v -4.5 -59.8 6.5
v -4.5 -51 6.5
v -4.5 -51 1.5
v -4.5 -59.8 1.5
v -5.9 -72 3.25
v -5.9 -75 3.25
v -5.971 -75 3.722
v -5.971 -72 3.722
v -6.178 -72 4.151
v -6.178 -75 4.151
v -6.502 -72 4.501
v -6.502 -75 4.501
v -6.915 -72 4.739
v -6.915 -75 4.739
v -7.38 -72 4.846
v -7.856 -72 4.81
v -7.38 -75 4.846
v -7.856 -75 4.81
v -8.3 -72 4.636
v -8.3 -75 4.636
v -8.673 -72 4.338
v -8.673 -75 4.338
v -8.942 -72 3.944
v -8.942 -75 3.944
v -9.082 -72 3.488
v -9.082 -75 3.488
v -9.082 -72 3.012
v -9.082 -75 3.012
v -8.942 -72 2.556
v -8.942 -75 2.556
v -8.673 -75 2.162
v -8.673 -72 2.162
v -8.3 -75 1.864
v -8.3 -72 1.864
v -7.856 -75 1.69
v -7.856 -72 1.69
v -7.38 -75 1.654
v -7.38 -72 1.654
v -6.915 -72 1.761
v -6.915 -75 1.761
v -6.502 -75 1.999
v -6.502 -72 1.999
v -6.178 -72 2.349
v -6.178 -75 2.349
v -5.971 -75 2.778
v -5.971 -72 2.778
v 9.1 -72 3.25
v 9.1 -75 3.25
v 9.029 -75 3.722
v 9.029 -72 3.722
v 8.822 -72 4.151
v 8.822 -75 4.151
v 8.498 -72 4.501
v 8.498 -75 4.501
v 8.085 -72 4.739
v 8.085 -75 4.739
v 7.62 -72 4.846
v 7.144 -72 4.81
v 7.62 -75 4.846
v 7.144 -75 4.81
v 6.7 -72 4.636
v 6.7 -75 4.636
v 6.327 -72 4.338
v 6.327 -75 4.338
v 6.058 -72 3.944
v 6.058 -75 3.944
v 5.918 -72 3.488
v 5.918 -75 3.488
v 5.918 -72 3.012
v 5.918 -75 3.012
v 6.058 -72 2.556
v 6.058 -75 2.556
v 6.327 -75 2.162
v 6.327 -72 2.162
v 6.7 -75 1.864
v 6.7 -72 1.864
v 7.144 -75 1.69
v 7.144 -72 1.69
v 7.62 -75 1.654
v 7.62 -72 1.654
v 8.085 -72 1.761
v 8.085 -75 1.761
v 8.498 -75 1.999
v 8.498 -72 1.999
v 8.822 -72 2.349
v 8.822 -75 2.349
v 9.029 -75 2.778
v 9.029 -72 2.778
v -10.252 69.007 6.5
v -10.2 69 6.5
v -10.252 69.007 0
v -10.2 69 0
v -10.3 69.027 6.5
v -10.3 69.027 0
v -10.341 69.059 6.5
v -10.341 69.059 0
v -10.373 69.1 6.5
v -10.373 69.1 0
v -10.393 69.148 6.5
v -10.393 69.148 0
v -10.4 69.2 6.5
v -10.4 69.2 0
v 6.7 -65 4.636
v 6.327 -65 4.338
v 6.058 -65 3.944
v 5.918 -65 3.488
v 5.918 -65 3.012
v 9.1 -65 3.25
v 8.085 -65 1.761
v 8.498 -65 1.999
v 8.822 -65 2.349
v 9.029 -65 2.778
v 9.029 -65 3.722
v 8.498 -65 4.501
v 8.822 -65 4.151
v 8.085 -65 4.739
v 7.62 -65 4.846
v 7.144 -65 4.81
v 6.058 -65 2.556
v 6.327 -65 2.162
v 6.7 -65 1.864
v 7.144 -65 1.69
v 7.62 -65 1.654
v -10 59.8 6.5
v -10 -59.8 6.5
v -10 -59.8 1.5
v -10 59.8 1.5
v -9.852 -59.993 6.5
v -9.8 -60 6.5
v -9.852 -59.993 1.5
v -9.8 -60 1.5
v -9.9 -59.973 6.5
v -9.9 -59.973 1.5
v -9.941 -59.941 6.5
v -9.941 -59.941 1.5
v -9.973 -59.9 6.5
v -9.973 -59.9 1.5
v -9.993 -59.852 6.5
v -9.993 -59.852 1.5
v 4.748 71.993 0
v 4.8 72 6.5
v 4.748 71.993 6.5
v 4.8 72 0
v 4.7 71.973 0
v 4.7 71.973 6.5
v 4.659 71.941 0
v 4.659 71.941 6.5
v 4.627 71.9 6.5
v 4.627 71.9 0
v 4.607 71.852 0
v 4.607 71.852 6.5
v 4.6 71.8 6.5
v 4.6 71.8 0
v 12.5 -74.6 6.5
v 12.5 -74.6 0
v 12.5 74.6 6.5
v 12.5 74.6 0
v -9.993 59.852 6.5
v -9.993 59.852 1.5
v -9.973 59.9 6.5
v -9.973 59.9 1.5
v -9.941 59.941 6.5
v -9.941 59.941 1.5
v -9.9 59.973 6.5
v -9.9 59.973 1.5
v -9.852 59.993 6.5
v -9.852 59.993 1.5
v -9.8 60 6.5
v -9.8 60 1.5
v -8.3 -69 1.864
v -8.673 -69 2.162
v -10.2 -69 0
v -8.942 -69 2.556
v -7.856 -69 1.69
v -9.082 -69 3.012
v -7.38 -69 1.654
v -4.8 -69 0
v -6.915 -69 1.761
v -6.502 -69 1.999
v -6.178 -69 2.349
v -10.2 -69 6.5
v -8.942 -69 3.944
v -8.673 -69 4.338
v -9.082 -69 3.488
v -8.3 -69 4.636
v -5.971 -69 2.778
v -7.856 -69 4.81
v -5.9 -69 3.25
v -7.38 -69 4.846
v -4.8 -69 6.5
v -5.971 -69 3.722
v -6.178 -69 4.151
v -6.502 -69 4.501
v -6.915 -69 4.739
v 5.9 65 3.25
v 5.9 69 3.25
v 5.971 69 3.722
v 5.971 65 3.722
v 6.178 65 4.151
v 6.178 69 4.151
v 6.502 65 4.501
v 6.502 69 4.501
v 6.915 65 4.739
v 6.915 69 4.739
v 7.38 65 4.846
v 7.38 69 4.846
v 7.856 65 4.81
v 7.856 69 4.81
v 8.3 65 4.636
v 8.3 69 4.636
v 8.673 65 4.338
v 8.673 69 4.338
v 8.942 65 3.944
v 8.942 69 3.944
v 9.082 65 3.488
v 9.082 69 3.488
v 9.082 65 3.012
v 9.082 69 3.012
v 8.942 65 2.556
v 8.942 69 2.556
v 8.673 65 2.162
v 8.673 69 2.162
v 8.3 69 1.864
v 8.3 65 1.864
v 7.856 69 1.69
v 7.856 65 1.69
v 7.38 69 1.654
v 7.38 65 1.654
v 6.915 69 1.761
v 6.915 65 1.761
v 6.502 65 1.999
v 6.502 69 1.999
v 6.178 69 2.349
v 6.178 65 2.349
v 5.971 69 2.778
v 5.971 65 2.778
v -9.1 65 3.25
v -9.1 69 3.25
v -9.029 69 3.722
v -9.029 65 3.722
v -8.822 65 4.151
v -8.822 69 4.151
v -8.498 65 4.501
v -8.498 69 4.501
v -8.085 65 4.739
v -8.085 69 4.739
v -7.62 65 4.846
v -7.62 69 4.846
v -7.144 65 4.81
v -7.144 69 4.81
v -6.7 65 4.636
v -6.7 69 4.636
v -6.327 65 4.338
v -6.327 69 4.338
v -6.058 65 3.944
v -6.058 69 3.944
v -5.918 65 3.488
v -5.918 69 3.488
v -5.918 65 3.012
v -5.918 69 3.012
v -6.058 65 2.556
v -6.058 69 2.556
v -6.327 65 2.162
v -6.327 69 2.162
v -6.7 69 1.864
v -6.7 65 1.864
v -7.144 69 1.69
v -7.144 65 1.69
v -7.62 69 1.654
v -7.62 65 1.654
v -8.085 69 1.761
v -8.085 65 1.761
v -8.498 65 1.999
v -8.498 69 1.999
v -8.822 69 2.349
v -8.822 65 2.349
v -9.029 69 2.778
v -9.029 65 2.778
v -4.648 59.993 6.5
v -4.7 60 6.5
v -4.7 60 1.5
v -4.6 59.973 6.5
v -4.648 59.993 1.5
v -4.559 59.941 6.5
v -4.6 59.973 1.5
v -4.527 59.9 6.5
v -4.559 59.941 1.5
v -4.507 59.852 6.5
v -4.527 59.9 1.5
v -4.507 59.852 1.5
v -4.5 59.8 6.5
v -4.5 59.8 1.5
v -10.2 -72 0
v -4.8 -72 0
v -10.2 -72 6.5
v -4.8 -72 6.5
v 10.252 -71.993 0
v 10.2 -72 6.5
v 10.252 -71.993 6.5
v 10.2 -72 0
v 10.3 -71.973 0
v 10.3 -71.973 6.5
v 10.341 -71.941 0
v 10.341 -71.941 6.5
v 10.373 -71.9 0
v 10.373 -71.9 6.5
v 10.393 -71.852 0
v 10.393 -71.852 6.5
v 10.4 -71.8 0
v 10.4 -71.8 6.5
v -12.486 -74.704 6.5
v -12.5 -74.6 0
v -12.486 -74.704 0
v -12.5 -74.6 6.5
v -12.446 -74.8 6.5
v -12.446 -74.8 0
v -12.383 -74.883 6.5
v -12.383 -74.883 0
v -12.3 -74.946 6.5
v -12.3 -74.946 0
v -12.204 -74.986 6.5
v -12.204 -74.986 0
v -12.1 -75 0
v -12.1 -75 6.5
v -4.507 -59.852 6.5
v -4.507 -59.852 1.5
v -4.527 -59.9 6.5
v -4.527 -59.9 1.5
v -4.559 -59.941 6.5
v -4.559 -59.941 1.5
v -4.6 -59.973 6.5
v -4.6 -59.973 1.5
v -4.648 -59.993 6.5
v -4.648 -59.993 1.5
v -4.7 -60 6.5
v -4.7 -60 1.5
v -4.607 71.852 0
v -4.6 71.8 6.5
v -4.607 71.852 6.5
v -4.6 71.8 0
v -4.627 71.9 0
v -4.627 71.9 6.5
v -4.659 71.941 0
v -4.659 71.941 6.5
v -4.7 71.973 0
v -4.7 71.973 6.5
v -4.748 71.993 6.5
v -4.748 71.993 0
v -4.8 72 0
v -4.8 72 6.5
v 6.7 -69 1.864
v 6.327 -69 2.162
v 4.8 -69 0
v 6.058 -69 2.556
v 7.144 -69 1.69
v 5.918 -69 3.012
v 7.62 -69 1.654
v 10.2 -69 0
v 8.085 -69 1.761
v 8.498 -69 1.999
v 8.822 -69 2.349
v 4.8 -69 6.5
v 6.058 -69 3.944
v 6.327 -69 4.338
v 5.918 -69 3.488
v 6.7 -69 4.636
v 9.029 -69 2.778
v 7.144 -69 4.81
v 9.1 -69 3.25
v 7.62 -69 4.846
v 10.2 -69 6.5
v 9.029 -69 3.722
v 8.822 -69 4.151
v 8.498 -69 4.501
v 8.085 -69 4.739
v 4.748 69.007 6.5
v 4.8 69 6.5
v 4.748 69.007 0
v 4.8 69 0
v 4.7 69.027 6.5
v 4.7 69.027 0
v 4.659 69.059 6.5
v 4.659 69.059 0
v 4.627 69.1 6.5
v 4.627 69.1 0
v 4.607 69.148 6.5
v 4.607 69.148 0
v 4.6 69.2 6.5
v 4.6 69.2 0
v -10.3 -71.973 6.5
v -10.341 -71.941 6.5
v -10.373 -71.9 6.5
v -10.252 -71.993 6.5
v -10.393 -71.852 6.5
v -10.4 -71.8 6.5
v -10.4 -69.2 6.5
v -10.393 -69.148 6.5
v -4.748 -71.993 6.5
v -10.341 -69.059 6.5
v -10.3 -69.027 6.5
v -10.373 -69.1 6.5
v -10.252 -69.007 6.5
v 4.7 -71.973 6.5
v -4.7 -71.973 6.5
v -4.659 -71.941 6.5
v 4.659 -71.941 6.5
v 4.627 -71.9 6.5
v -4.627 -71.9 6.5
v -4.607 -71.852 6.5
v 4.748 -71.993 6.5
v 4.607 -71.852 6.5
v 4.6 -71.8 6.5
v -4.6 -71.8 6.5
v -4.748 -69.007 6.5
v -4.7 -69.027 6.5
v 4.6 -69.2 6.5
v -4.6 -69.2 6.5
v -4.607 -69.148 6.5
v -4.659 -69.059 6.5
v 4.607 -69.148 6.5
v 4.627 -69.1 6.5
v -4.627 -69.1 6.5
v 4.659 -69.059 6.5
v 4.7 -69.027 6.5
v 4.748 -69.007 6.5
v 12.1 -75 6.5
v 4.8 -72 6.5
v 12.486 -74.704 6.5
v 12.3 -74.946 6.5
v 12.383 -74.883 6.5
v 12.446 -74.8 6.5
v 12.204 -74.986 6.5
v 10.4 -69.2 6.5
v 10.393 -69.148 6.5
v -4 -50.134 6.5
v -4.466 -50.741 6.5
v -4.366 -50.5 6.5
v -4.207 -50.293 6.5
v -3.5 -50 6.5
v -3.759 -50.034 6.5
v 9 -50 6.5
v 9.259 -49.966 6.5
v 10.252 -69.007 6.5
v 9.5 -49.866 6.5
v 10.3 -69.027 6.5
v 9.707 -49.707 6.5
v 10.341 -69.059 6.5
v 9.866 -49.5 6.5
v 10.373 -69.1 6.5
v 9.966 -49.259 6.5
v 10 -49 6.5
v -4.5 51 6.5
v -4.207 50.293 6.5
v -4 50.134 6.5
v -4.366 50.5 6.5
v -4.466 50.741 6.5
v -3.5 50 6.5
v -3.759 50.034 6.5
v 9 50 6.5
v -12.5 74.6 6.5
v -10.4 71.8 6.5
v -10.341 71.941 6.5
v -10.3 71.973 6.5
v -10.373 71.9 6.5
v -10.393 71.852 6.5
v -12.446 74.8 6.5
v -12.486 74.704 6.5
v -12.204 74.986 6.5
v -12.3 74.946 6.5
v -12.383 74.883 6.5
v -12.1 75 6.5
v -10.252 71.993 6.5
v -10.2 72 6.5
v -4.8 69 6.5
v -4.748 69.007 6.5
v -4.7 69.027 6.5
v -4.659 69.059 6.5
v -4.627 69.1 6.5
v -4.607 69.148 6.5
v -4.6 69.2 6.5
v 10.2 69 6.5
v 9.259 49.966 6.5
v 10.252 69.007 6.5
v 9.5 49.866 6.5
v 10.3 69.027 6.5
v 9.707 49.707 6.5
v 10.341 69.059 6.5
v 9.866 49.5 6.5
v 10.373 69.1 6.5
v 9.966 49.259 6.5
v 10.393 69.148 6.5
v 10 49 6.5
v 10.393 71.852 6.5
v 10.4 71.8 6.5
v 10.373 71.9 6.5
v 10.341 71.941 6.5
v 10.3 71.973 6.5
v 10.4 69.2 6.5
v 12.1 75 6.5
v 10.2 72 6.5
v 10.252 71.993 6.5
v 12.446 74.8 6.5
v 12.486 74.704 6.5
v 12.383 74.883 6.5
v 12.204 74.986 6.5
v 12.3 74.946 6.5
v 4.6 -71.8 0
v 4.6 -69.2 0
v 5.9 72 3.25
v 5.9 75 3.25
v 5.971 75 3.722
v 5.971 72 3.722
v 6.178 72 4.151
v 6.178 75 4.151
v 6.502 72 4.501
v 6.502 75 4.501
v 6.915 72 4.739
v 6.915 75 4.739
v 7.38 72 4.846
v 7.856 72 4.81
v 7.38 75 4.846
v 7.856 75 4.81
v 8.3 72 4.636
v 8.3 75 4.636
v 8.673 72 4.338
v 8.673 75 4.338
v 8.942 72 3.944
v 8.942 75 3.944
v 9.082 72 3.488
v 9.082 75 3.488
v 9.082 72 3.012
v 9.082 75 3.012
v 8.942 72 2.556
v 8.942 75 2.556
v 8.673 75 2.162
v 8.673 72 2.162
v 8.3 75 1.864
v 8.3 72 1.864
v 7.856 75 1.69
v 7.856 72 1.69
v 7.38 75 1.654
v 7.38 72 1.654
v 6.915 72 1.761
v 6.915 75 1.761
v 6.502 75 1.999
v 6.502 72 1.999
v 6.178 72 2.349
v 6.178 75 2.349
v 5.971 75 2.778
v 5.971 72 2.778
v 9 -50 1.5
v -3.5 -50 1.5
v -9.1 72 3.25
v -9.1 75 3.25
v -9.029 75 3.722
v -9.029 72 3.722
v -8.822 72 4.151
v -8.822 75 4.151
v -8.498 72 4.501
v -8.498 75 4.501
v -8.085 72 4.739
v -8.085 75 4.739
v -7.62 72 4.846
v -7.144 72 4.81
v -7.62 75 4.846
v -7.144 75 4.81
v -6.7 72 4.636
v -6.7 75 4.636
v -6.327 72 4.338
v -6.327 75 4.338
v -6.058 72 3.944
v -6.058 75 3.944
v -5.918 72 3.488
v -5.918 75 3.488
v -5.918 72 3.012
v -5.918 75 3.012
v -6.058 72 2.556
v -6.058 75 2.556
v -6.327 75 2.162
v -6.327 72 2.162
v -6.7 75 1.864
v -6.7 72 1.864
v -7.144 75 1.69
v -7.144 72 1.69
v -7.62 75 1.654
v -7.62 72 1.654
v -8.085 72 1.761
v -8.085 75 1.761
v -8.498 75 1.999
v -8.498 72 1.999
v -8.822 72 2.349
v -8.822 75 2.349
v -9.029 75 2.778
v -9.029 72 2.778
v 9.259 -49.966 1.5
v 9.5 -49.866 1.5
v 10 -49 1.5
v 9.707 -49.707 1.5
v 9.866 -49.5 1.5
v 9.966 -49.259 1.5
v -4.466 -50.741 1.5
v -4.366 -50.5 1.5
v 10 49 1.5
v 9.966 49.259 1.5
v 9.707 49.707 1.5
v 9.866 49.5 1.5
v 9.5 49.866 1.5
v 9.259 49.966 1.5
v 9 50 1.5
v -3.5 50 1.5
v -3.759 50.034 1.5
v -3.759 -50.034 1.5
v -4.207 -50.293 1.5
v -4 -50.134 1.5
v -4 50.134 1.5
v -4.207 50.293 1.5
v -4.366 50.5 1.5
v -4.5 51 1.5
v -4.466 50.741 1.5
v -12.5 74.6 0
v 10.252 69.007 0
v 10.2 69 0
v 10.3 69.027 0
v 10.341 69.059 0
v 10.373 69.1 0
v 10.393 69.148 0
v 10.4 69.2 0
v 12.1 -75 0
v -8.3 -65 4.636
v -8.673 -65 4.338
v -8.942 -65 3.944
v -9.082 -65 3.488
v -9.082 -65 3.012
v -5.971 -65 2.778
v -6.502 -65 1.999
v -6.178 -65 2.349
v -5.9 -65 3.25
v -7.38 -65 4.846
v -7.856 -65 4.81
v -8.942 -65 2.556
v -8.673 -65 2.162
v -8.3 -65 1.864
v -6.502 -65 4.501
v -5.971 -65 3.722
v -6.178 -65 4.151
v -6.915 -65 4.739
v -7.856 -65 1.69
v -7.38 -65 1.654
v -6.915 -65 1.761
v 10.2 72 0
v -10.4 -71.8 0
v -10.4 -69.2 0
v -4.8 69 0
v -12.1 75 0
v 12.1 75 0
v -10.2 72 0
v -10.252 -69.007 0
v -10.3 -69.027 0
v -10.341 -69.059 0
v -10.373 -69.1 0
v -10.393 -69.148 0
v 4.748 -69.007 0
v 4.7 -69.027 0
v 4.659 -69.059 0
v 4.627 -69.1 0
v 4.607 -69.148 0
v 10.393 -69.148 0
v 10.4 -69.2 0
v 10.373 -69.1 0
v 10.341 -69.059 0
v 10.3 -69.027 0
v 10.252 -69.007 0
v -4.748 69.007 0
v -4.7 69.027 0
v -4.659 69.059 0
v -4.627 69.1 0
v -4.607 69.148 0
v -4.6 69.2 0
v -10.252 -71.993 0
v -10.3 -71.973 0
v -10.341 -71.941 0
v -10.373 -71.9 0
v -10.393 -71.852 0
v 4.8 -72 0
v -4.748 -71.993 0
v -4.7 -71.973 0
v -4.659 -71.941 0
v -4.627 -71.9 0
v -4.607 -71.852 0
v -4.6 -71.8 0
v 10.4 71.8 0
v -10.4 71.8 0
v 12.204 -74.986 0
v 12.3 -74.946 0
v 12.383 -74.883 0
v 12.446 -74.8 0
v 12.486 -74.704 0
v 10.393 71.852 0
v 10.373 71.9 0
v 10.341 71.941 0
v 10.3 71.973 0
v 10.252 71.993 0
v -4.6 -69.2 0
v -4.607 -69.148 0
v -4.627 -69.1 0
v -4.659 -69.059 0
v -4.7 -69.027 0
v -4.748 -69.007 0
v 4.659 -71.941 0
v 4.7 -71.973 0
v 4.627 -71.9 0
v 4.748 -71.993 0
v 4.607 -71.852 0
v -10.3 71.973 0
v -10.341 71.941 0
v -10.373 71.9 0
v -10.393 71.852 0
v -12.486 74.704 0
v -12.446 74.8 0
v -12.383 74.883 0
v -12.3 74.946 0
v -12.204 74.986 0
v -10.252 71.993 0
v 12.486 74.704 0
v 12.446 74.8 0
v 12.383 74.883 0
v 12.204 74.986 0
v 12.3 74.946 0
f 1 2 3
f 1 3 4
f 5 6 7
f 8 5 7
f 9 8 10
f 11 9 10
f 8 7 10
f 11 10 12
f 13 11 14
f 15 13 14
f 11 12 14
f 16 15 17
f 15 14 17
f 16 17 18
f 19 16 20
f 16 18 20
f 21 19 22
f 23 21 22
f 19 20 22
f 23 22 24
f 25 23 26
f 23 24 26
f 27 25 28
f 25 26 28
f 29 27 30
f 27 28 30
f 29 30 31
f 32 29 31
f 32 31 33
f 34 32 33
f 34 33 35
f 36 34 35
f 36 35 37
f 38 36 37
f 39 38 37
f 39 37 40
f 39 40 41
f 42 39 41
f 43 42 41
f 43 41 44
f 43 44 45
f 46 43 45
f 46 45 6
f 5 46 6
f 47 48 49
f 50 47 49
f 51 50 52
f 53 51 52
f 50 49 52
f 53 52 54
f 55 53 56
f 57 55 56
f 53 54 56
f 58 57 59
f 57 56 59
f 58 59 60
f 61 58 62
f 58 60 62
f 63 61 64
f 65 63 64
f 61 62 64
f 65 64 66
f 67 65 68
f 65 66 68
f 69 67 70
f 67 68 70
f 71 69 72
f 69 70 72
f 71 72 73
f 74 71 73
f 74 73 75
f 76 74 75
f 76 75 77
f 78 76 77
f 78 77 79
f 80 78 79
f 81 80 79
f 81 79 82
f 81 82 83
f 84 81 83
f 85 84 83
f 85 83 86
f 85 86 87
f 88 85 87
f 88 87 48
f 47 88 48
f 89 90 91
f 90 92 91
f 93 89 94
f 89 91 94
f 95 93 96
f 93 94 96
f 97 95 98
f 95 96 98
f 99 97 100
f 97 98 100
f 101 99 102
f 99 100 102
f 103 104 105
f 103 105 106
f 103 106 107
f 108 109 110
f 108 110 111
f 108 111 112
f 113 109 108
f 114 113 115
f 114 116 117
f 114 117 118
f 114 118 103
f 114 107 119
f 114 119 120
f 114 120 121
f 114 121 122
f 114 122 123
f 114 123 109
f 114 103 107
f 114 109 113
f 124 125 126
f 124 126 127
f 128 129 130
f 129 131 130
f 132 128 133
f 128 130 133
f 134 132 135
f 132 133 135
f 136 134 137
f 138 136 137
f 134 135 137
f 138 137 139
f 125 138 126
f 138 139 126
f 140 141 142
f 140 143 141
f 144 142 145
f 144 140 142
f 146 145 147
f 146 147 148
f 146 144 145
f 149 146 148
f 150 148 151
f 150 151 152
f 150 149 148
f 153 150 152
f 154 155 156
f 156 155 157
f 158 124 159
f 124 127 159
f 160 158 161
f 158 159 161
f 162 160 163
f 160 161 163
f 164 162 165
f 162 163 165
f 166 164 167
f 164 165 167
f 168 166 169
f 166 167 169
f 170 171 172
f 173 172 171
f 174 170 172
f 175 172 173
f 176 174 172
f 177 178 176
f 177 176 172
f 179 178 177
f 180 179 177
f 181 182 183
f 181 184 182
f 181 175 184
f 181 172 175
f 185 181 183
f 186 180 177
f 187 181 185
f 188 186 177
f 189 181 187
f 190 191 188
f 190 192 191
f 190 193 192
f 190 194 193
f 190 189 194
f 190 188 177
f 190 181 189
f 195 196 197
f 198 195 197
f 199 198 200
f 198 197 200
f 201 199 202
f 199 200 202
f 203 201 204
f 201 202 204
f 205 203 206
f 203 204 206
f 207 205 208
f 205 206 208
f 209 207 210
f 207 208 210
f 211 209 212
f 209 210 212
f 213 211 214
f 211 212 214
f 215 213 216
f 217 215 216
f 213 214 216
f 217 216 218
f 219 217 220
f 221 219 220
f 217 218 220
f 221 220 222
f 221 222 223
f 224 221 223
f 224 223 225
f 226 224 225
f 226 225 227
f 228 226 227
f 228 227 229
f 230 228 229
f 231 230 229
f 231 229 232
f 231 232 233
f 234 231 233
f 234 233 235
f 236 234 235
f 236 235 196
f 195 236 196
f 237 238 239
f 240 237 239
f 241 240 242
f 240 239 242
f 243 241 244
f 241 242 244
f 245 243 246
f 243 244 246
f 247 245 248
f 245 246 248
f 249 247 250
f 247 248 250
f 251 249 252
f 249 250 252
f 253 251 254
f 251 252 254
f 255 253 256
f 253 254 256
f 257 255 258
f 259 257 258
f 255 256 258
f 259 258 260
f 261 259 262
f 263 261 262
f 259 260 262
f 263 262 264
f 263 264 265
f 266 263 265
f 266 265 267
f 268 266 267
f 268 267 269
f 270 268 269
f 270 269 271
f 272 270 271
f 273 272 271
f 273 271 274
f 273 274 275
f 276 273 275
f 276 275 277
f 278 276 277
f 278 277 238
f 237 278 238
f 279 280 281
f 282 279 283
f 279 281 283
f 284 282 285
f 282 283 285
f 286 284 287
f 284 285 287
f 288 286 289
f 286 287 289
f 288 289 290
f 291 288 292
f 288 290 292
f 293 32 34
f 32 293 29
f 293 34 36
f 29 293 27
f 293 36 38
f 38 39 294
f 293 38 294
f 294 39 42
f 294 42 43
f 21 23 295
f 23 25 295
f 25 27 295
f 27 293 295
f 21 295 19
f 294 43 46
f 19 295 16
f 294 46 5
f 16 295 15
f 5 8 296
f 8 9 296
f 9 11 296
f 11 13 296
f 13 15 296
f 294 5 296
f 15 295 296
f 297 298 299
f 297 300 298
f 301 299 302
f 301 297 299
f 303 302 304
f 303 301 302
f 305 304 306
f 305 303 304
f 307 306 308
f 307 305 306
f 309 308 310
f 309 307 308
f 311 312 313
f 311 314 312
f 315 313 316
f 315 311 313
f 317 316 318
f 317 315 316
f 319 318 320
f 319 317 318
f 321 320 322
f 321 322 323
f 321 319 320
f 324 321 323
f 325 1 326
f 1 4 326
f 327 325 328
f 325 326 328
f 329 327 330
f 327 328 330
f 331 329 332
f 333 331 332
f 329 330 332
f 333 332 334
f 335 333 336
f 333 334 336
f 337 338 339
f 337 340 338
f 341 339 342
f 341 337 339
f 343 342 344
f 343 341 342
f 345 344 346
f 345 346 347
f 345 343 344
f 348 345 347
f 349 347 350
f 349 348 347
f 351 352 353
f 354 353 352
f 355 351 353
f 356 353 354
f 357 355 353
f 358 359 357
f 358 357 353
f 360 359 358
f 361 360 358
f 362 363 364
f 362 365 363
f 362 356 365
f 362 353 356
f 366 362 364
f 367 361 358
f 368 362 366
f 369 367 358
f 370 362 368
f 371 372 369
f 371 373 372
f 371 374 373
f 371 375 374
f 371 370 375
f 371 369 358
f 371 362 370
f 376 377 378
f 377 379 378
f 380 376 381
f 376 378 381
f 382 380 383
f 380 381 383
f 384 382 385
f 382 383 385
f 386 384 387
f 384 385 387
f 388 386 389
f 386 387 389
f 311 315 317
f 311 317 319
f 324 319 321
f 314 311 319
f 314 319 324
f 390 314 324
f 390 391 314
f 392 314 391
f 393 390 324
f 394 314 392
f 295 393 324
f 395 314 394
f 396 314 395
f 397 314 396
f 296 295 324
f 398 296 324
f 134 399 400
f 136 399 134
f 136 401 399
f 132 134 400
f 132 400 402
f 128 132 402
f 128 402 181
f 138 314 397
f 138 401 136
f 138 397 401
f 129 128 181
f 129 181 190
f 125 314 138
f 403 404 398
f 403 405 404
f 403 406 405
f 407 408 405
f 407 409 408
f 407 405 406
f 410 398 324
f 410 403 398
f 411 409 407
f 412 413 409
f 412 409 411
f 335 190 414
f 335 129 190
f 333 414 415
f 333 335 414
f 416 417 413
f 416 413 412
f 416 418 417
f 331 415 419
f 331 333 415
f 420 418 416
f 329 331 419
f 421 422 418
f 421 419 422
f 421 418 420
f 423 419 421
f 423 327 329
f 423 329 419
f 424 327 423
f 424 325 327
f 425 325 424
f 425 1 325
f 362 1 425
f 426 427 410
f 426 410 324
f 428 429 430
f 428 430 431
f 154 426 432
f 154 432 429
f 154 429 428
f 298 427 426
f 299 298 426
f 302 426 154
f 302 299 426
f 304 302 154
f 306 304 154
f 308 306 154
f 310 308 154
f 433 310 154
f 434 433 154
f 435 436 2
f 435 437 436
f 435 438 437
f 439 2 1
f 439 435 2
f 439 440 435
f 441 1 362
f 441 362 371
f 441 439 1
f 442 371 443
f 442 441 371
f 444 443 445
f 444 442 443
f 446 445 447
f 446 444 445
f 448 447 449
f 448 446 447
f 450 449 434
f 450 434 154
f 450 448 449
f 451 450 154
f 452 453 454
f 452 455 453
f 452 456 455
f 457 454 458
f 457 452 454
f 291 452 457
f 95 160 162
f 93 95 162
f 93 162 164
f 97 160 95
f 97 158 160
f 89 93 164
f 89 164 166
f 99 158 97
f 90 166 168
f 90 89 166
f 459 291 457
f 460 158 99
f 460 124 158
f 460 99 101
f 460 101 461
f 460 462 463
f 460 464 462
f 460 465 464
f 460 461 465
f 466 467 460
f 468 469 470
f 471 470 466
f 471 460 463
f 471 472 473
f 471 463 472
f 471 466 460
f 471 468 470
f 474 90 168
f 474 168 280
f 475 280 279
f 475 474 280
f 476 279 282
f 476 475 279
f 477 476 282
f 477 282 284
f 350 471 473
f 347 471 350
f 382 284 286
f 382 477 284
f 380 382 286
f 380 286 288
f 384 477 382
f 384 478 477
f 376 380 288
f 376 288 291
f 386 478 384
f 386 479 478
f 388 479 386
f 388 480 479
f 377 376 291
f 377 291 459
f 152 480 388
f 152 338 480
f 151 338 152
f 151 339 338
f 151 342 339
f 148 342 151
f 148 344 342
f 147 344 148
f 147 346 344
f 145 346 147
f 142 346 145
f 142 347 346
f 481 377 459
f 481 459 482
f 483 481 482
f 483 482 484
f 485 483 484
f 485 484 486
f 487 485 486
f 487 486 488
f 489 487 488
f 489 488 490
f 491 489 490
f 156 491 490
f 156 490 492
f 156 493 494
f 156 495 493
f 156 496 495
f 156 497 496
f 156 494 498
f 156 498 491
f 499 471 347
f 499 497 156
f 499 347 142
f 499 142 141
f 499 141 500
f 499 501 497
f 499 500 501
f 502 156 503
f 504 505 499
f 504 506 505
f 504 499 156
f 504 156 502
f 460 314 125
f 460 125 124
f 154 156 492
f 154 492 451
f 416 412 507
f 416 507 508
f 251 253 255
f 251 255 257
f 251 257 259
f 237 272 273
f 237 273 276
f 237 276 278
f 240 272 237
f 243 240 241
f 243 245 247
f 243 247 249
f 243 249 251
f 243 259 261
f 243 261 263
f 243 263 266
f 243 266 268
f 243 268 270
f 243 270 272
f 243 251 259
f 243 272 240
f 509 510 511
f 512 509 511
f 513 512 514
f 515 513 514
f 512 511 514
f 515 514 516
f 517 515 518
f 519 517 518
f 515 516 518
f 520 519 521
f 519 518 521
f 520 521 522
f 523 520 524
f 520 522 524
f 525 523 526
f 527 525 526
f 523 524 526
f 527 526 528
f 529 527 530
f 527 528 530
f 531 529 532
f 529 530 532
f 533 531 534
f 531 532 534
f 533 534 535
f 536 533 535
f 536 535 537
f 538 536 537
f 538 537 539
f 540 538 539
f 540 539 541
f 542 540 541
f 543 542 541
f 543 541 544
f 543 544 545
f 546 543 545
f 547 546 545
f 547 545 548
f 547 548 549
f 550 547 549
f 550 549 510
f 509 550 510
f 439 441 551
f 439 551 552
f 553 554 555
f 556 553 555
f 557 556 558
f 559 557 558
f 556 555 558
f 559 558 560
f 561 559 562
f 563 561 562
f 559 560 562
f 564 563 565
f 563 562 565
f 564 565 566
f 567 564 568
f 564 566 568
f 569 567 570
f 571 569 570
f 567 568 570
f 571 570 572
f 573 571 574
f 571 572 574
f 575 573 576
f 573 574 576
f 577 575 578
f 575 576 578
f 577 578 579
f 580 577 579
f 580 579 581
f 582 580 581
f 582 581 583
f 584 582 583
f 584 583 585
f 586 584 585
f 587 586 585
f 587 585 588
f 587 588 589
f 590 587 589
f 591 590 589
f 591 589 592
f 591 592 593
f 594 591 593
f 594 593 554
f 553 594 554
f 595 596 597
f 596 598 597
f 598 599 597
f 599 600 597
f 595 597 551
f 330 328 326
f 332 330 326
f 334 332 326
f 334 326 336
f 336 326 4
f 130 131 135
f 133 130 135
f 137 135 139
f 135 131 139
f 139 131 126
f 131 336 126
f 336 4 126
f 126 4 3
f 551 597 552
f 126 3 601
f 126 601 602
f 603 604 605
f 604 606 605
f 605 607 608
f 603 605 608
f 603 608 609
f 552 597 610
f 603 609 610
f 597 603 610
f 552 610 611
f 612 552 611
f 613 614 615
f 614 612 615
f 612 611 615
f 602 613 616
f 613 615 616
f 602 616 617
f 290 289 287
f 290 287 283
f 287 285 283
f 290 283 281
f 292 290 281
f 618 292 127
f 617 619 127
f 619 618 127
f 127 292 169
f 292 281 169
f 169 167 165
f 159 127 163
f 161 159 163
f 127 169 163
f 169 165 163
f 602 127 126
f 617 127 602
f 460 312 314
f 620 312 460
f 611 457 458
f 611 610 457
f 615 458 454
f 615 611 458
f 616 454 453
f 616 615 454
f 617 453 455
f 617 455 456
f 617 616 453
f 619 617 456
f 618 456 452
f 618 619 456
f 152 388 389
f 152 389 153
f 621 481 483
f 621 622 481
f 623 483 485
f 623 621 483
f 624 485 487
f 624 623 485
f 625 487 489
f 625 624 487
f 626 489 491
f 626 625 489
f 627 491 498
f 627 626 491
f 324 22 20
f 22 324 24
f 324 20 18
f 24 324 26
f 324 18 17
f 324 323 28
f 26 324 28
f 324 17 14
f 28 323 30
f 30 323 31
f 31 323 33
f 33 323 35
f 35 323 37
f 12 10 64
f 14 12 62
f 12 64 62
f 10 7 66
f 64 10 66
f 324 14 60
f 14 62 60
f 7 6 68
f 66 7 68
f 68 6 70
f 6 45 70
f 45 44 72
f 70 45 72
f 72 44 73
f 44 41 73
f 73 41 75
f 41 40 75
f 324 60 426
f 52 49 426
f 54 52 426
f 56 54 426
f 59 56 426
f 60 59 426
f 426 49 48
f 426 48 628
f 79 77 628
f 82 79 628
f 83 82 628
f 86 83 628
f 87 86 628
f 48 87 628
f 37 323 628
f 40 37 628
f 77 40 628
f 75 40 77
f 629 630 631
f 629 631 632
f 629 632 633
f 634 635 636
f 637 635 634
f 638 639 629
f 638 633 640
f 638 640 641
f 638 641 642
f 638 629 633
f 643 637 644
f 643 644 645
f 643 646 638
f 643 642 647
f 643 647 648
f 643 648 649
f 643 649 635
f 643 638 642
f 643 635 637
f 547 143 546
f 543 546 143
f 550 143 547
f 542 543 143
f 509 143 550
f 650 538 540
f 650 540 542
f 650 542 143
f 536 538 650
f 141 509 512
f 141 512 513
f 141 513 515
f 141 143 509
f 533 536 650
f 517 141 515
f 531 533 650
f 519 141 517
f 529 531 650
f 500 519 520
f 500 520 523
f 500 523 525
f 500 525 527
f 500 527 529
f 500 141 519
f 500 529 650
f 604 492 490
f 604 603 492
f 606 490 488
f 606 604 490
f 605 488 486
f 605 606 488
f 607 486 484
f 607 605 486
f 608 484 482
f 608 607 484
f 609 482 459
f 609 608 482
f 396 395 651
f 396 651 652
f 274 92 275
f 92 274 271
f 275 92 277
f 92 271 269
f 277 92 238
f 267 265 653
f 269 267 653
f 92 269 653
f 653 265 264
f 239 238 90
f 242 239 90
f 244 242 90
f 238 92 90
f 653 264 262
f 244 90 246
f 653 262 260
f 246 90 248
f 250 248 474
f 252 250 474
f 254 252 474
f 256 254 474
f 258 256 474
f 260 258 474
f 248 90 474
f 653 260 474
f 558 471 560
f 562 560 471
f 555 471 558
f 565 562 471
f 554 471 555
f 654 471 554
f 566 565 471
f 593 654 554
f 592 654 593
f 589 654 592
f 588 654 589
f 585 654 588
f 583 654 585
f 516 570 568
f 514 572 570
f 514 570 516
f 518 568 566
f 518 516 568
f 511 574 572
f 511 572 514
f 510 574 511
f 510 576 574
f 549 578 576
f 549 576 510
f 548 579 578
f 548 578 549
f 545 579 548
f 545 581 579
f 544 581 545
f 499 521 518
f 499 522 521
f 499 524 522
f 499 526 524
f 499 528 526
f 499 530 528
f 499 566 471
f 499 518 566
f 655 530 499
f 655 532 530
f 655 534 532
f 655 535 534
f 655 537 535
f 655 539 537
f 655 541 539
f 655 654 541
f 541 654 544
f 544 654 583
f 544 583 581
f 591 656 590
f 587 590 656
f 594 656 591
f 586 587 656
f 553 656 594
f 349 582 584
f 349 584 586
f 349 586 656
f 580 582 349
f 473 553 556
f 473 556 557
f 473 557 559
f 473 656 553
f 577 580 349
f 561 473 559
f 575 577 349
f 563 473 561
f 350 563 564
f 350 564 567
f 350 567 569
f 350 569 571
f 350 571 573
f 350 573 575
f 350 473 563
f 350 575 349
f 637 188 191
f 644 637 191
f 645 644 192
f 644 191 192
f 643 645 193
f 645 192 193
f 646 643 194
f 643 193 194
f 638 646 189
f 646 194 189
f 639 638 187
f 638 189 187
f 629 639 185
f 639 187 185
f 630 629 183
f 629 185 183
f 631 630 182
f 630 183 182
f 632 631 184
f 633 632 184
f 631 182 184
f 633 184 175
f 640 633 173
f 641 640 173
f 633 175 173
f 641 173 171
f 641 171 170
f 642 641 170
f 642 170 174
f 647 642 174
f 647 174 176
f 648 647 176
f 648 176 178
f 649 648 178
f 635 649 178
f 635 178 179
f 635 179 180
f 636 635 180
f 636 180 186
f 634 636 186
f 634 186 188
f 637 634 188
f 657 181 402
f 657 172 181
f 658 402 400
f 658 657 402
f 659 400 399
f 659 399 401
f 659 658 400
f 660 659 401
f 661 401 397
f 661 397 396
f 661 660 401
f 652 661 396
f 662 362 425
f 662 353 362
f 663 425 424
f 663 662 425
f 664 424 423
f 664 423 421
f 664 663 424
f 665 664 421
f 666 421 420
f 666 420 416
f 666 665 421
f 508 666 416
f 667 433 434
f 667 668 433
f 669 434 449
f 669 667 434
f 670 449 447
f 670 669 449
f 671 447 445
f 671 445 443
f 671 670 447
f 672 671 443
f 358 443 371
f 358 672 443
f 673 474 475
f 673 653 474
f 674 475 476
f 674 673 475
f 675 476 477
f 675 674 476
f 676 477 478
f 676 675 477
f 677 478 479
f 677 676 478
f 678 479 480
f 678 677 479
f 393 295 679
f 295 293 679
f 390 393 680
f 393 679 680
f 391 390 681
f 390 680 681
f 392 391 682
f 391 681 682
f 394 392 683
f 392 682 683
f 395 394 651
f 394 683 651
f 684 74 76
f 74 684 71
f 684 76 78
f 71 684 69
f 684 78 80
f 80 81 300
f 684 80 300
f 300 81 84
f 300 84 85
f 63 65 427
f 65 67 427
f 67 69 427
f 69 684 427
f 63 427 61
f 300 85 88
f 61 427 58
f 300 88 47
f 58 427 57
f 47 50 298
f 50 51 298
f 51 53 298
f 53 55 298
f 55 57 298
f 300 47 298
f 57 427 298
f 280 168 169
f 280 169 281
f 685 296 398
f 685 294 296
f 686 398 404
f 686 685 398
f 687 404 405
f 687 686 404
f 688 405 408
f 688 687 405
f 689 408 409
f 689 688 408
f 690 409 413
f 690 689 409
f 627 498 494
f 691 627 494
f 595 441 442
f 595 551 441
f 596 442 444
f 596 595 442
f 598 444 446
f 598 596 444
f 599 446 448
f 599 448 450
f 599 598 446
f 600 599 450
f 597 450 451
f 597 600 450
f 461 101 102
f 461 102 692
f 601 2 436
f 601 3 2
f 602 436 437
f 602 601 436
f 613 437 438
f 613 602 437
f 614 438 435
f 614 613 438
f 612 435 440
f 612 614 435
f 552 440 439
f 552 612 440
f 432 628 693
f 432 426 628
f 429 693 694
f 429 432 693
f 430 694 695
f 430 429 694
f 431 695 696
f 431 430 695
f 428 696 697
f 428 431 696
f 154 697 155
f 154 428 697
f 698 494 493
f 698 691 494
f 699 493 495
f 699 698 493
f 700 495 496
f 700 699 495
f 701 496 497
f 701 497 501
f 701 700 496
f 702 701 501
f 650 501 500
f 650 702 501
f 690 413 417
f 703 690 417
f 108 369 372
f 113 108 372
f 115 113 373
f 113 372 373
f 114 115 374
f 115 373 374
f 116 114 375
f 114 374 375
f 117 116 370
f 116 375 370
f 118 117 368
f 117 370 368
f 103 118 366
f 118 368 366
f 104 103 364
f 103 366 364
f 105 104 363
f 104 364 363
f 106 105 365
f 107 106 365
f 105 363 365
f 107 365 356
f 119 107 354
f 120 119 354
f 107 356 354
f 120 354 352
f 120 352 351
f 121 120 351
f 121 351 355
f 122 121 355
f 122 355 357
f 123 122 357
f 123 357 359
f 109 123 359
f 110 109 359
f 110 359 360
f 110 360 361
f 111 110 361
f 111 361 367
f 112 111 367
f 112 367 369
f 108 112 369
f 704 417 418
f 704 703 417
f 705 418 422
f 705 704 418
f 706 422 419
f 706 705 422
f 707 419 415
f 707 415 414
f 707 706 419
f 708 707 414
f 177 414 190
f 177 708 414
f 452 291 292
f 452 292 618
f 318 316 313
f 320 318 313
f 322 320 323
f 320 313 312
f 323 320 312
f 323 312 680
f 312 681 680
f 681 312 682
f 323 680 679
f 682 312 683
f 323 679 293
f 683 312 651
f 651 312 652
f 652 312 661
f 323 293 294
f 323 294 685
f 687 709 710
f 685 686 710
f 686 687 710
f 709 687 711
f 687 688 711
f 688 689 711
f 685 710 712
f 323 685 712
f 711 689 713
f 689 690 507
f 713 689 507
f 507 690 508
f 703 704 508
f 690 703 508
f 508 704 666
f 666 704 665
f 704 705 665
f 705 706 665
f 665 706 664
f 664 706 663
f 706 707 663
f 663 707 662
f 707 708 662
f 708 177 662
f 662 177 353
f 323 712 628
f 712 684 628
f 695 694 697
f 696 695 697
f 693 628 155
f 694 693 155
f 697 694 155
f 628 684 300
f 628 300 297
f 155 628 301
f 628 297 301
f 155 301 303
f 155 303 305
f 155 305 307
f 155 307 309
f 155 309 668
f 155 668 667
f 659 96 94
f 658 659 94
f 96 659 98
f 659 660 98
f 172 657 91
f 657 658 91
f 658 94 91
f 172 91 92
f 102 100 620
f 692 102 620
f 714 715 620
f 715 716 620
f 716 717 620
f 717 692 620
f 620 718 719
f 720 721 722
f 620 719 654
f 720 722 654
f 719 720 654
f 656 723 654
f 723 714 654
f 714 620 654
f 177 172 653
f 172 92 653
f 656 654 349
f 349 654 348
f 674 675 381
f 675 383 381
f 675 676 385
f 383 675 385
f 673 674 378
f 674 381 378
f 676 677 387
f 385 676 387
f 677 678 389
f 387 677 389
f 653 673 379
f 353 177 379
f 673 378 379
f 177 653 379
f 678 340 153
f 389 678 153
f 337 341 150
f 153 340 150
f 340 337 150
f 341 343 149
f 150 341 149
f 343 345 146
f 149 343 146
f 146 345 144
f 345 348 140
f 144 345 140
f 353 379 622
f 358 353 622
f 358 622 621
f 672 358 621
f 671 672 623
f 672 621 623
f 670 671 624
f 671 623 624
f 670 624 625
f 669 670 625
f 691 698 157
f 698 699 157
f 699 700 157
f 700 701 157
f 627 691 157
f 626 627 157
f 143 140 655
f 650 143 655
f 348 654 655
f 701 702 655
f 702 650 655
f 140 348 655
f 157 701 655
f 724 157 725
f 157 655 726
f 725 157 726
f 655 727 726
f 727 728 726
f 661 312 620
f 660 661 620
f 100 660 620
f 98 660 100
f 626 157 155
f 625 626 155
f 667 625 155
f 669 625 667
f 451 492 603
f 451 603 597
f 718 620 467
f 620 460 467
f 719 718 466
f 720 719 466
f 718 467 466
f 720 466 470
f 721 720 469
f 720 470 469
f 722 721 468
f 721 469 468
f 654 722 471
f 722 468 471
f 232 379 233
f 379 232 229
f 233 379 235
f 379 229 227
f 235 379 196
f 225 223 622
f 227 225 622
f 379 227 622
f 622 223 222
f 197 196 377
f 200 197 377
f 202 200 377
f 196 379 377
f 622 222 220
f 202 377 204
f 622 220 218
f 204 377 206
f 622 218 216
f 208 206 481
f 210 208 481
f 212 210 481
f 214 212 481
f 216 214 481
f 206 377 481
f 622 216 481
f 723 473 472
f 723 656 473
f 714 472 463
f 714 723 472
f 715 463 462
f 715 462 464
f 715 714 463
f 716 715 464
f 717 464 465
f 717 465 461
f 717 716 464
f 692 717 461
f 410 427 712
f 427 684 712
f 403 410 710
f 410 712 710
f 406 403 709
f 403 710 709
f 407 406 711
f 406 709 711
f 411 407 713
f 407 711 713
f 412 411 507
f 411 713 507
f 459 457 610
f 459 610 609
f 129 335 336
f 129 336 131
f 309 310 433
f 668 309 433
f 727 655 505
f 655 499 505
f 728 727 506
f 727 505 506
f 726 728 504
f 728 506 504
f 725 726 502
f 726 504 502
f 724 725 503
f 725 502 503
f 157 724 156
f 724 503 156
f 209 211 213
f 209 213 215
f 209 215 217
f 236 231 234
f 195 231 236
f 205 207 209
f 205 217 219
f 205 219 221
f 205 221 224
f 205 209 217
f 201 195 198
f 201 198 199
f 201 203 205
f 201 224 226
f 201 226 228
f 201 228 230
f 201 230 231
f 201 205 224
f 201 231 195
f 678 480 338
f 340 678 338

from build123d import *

# Parameters (mm, degrees)
SKETCH_W        = 25
SKETCH_H        = 150
PAD_DEPTH       = 6.5
SKETCH001_R     = 1.6
POCKET_DEPTH    = 10
SKETCH002_R     = 1.6
POCKET001_DEPTH = 10
SKETCH003_W     = 5.8
SKETCH003_H     = 3
POCKET002_DEPTH = 6.5
FILLET_R        = 0.4
FILLET001_R     = 0.2
POCKET003_DEPTH = 5
FILLET002_R     = 1
FILLET003_R     = 0.2


with BuildPart() as part:
    # Sketch → Pad (new body)
    with BuildSketch(Plane.XY):
        Rectangle(SKETCH_W, SKETCH_H)
    extrude(amount=PAD_DEPTH)

    # Sketch001 (on Face3 of Pad) → Pocket (cut)
    with BuildSketch(Plane.XZ.offset(75)):
        with Locations((-7.5, 3.25)):
            Circle(SKETCH001_R)
        with Locations((7.5, 3.25)):
            Circle(SKETCH001_R)
    extrude(amount=-POCKET_DEPTH, mode=Mode.SUBTRACT)

    # Sketch002 (on Face1 of Pocket) → Pocket001 (cut)
    with BuildSketch(Plane(origin=(0, 75, 0), x_dir=(-1, 0, 0), z_dir=(0, 1, 0))):
        with Locations((-7.5, 3.25)):
            Circle(SKETCH002_R)
        with Locations((7.5, 3.25)):
            Circle(SKETCH002_R)
    extrude(amount=-POCKET001_DEPTH, mode=Mode.SUBTRACT)

    # Sketch003 (on Face4 of Pocket001) → Pocket002 (cut)
    with BuildSketch(Plane.XY.offset(6.5)):
        with Locations((-7.5, 70.5)):
            Rectangle(SKETCH003_W, SKETCH003_H)
        with Locations((7.5, 70.5)):
            Rectangle(SKETCH003_W, SKETCH003_H)
        with Locations((-7.5, -70.5)):
            Rectangle(SKETCH003_W, SKETCH003_H)
        with Locations((7.5, -70.5)):
            Rectangle(SKETCH003_W, SKETCH003_H)
    extrude(amount=-POCKET002_DEPTH, mode=Mode.SUBTRACT)

    # Fillet
    fillet_edges = [part.edges().sort_by_distance(p)[0] for p in [
        (-12.5, -75, 3.25),
        (12.5, -75, 3.25),
        (12.5, 75, 3.25),
        (-12.5, 75, 3.25),
    ]]
    fillet(fillet_edges, radius=FILLET_R)

    # Fillet001
    fillet001_edges = [part.edges().sort_by_distance(p)[0] for p in [
        (-10.4, 72, 3.25),
        (4.6, 72, 3.25),
        (-10.4, -69, 3.25),
        (4.6, -69, 3.25),
        (-4.6, -69, 3.25),
        (10.4, -69, 3.25),
        (-4.6, 72, 3.25),
        (10.4, 72, 3.25),
        (10.4, 69, 3.25),
        (-4.6, 69, 3.25),
        (10.4, -72, 3.25),
        (-4.6, -72, 3.25),
        (-10.4, -72, 3.25),
        (4.6, -72, 3.25),
        (-10.4, 69, 3.25),
        (4.6, 69, 3.25),
    ]]
    fillet(fillet001_edges, radius=FILLET001_R)

    # Sketch004 (on Face42 of Fillet001) → Pocket003 (cut)
    with BuildSketch(Plane.XY.offset(6.5)):
        Polygon((-10, -60), (-10, 60), (-4.5, 60), (-4.5, 50), (10, 50), (10, -50), (-4.5, -50), (-4.5, -60), align=None)
    extrude(amount=-POCKET003_DEPTH, mode=Mode.SUBTRACT)

    # Fillet002
    fillet002_edges = [part.edges().sort_by_distance(p)[0] for p in [
        (-4.5, 50, 4),
        (10, 50, 4),
        (-4.5, -50, 4),
        (10, -50, 4),
    ]]
    fillet(fillet002_edges, radius=FILLET002_R)

    # Fillet003
    fillet003_edges = [part.edges().sort_by_distance(p)[0] for p in [
        (-4.5, 60, 4),
        (-10, 60, 4),
        (-4.5, -60, 4),
        (-10, -60, 4),
    ]]
    fillet(fillet003_edges, radius=FILLET003_R)


solid = part.part
